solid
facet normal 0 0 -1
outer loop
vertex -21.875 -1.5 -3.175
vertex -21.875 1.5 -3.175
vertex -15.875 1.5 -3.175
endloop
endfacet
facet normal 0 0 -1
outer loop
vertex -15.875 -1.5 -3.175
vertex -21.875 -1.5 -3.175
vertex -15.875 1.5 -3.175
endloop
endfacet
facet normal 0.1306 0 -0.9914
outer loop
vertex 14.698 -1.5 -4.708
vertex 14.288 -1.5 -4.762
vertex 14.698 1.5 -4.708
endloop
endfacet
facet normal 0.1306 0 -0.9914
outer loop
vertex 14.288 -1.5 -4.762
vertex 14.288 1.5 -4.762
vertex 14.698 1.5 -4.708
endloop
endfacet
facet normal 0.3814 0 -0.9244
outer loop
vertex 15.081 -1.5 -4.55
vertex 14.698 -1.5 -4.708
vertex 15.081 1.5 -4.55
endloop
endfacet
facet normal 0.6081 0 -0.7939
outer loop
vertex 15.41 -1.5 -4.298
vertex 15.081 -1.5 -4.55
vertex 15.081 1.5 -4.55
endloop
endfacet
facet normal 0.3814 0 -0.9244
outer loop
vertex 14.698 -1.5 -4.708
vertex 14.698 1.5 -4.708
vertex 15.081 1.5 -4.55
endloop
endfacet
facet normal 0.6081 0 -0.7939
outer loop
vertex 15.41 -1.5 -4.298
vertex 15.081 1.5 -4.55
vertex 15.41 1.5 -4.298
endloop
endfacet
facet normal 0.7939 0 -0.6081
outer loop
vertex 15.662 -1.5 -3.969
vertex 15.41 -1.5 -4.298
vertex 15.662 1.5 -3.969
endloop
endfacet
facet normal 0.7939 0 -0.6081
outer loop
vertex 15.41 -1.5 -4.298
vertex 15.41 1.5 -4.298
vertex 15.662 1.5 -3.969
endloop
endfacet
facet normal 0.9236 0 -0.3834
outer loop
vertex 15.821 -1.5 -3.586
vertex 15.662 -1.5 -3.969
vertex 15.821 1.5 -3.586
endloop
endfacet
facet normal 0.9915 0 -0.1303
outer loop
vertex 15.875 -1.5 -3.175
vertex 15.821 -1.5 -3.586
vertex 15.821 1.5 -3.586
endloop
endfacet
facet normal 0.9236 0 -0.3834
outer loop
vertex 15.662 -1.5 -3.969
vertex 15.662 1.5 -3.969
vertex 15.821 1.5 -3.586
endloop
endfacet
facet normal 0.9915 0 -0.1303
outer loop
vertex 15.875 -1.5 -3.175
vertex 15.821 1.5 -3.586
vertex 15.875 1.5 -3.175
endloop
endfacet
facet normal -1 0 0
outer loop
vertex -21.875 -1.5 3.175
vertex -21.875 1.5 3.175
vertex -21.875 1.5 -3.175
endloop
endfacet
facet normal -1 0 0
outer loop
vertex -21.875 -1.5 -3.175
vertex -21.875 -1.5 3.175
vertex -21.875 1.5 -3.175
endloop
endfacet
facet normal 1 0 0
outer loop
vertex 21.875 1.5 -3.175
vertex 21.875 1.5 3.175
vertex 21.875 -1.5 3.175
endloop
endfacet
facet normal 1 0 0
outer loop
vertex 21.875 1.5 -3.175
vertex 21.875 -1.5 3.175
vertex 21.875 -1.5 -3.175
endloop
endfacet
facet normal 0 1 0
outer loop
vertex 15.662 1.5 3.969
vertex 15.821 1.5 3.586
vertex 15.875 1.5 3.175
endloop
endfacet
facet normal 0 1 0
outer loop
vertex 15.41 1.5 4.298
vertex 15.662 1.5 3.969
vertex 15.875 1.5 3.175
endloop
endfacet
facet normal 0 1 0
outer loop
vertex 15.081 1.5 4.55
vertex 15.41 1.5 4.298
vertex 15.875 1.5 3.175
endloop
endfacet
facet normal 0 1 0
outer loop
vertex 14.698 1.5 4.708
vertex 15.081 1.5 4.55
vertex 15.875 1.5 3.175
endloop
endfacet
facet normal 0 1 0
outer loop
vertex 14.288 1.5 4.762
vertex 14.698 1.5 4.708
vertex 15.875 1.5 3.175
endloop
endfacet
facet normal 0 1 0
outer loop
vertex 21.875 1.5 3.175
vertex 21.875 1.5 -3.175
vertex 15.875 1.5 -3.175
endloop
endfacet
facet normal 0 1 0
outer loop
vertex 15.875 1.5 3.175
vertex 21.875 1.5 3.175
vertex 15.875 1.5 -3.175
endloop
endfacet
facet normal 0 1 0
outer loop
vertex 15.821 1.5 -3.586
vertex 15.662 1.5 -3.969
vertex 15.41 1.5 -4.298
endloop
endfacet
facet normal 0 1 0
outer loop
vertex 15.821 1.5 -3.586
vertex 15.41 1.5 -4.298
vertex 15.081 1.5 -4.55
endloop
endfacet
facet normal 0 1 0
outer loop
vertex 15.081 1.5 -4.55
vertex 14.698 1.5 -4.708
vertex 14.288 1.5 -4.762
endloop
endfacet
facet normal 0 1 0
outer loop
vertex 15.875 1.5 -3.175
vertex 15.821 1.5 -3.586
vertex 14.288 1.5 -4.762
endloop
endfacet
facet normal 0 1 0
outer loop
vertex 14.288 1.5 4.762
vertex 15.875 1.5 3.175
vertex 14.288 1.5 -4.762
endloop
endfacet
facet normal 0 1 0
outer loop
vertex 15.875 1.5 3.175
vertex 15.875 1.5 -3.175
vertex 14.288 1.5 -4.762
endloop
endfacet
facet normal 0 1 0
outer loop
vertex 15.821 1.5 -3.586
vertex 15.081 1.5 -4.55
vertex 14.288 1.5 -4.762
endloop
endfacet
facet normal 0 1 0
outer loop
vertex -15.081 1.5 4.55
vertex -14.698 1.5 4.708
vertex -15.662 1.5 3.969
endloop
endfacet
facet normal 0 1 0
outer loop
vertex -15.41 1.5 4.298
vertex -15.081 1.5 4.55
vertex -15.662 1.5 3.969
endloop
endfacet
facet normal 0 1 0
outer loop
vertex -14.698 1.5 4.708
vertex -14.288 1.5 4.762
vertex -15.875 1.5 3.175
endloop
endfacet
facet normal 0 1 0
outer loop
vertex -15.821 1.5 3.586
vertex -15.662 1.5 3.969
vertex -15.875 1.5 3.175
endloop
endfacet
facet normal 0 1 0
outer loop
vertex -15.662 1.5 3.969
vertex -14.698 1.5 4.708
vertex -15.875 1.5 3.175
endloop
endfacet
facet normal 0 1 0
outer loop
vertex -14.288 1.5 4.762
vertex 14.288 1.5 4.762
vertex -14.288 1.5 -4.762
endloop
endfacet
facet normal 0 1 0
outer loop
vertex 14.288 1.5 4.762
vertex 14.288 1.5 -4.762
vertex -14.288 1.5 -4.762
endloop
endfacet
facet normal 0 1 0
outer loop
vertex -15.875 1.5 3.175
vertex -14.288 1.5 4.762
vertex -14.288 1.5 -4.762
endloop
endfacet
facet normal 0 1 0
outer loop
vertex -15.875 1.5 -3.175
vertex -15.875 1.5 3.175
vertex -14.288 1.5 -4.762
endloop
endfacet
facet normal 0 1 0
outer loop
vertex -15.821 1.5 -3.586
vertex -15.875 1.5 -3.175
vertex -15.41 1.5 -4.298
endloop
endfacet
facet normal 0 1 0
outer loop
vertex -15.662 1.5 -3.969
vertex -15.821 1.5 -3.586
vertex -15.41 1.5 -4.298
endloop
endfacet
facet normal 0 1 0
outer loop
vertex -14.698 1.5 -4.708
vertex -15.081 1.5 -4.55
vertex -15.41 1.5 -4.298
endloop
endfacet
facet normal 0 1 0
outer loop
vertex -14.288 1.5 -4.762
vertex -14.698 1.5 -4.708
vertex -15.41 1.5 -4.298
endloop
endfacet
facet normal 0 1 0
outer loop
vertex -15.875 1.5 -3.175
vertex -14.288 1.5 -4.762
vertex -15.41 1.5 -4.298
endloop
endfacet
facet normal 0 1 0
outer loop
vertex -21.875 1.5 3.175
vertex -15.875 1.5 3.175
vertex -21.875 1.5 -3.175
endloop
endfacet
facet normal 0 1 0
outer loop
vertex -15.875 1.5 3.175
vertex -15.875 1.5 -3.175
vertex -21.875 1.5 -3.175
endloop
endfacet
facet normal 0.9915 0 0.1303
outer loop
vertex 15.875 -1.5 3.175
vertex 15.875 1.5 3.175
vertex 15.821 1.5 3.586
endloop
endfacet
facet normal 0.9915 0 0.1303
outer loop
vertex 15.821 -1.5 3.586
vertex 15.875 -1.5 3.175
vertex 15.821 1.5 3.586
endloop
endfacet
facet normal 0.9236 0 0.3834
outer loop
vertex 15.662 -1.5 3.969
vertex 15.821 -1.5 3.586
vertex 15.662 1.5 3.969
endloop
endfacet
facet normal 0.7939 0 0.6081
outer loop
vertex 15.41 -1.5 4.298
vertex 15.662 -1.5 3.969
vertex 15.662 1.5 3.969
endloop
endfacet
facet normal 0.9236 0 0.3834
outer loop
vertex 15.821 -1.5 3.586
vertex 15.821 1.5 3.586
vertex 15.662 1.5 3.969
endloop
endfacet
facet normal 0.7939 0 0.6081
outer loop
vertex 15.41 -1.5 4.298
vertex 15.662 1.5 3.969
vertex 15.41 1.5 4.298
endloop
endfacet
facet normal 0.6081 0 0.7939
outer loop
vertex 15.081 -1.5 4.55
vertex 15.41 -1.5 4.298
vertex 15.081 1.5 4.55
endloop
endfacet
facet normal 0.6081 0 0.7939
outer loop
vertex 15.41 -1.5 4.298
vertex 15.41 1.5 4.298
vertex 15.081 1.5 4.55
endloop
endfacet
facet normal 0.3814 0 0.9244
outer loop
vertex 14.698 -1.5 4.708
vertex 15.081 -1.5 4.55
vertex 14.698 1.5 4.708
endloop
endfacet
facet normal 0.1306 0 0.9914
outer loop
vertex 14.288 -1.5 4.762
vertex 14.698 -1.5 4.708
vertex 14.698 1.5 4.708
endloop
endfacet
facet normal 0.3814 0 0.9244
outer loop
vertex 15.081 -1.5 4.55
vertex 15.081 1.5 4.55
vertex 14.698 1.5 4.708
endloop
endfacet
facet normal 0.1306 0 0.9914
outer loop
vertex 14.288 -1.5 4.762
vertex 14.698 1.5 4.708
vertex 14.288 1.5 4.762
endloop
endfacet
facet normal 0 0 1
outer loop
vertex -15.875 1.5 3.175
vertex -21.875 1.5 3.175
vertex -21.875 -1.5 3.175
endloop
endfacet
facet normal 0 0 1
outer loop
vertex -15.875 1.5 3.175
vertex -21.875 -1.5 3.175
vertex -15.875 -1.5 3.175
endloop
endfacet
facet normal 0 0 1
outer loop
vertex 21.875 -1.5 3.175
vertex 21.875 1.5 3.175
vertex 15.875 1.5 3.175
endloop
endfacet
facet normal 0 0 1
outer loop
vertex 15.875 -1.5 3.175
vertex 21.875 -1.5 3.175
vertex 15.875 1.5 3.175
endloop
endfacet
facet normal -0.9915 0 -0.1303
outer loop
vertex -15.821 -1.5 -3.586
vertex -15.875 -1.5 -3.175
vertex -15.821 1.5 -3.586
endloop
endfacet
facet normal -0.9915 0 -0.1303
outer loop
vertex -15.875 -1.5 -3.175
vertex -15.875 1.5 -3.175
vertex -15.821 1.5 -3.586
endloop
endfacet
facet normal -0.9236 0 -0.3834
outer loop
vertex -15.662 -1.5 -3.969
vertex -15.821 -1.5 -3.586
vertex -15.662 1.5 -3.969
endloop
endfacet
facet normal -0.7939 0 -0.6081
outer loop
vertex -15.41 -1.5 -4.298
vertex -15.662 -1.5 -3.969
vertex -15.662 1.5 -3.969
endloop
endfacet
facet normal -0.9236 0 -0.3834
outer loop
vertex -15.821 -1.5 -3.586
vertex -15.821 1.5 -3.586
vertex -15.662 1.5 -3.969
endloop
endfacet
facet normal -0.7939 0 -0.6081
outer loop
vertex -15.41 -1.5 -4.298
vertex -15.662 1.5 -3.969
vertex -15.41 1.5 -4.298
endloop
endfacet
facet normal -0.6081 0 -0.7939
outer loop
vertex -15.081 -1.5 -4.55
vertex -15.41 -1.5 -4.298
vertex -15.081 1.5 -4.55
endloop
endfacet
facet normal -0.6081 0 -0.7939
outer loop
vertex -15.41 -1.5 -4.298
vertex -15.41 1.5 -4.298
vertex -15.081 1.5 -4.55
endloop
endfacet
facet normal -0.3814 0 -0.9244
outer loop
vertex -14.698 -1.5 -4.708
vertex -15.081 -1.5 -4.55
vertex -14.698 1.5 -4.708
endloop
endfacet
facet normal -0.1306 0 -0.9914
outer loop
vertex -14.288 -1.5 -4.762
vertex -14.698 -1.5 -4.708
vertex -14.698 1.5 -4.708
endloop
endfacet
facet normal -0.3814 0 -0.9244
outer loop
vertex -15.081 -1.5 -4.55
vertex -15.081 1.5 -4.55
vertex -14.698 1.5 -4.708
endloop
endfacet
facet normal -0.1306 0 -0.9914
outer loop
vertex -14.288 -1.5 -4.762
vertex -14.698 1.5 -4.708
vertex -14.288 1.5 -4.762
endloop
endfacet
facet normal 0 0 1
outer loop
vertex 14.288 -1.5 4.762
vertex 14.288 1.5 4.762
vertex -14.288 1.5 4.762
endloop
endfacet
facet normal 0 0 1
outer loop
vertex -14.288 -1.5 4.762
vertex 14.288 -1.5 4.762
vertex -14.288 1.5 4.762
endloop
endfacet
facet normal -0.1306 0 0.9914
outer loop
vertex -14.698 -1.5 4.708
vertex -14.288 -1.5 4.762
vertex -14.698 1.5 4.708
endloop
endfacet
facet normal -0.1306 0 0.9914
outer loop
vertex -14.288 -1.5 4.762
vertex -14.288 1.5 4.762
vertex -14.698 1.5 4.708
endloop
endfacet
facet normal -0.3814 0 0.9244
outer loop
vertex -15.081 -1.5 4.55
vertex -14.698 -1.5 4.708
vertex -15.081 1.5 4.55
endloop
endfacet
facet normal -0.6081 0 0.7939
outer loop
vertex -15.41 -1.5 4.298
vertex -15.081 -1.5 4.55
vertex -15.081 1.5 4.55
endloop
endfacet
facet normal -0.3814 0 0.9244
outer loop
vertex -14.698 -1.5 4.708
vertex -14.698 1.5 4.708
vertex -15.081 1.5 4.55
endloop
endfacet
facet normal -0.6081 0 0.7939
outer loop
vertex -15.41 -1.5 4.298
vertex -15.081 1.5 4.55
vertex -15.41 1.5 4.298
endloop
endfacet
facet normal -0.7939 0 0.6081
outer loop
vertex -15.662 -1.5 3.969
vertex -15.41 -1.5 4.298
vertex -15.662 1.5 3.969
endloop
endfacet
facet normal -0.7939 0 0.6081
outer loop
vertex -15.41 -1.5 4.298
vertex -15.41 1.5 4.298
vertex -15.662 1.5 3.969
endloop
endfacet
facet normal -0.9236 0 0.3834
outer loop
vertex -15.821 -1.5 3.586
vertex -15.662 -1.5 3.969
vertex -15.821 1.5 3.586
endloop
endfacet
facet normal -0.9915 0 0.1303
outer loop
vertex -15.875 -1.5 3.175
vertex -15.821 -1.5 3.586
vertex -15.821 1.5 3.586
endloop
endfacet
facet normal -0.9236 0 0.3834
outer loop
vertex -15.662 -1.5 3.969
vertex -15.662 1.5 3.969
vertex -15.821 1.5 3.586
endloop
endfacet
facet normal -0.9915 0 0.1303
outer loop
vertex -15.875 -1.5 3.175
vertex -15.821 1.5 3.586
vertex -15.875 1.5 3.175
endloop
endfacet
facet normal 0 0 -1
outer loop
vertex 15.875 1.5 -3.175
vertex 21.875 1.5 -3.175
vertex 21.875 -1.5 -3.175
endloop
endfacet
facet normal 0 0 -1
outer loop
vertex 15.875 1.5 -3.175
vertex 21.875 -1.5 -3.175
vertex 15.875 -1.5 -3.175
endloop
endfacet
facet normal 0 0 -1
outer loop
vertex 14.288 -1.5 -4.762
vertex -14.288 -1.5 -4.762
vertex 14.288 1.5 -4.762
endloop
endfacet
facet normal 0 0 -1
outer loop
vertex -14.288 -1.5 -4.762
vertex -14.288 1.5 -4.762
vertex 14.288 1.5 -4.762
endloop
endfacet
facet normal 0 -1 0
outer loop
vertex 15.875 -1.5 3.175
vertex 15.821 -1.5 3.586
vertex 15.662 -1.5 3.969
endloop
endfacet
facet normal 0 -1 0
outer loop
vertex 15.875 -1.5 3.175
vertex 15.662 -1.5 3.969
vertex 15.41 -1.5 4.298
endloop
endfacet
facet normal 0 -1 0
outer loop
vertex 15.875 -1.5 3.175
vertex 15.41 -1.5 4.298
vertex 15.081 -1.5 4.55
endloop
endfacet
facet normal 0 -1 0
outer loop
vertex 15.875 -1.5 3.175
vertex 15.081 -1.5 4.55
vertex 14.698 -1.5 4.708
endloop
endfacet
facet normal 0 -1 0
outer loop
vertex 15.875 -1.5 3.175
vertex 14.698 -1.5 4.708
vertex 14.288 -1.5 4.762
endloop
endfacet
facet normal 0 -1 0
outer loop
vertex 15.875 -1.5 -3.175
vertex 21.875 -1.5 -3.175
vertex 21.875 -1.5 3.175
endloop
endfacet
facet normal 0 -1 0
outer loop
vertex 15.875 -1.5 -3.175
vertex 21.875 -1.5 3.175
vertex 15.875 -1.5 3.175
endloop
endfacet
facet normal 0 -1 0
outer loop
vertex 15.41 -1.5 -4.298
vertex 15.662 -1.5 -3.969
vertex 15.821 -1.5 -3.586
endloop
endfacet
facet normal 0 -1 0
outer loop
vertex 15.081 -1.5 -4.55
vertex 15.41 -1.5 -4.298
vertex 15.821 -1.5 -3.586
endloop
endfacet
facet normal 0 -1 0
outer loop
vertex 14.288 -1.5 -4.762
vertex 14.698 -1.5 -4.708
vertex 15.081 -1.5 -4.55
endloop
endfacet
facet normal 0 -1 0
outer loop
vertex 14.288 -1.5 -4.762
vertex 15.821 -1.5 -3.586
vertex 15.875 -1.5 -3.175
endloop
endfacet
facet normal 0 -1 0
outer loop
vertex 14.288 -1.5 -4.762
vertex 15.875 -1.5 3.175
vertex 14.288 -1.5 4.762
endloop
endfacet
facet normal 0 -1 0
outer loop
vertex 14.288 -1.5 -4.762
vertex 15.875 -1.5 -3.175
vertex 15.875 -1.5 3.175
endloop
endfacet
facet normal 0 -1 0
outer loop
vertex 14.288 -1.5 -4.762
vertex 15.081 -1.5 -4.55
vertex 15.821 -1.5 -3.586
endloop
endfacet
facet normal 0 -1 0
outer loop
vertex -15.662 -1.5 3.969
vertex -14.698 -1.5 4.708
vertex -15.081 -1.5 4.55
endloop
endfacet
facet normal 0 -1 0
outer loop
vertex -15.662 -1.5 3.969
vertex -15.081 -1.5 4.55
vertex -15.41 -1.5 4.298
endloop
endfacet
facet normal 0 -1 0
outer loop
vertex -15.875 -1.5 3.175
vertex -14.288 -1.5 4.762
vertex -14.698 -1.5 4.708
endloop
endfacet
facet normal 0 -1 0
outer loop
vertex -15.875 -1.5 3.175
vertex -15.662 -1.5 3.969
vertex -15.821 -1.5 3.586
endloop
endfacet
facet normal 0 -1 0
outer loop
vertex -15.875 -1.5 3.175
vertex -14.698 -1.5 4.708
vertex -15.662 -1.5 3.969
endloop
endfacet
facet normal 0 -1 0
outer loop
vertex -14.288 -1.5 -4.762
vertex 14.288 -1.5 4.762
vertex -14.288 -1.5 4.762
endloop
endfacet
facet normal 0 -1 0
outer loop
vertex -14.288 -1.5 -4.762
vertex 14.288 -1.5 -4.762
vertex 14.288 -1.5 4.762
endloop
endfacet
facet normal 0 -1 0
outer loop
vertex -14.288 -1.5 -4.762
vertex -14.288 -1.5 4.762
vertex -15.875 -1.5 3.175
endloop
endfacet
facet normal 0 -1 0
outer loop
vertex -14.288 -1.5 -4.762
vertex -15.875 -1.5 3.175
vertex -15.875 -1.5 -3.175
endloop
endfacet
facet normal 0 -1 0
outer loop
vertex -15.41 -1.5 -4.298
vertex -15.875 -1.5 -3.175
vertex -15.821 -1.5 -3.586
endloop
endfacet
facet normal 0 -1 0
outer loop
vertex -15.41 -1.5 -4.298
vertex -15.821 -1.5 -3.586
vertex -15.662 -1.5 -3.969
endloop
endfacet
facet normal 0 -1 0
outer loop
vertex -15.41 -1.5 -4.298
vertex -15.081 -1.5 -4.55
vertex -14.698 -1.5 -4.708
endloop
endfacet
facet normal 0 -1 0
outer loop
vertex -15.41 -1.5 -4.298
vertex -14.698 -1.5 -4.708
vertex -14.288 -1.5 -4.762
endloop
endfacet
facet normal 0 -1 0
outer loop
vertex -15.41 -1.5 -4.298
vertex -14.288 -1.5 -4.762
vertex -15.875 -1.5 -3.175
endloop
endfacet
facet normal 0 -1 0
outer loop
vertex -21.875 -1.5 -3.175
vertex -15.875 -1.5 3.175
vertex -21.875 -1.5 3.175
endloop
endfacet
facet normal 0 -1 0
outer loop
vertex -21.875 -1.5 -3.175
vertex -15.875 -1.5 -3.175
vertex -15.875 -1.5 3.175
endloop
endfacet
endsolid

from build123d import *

# Parameters (mm, degrees)
BOSS_EXTRUDE1_DEPTH = 1.5
SKETCH2_W           = 6
SKETCH2_H           = 6.35
BOSS_EXTRUDE2_DEPTH = 3


with BuildPart() as part:
    # Sketch1 → Boss-Extrude1 (new, symmetric)
    with BuildSketch(Plane(origin=(0, 0, 0), x_dir=(1, 0, 0), z_dir=(0, 1, 0))):
        with BuildLine():
            Line((14.2875, -4.7625), (-14.2875, -4.7625))
            ThreePointArc((-14.2875, -4.7625), (-15.410032015, -4.297532015), (-15.875, -3.175))
            Line((-15.875, -3.175), (-15.875, 3.175))
            ThreePointArc((-15.875, 3.175), (-15.410032015, 4.297532015), (-14.2875, 4.7625))
            Line((-14.2875, 4.7625), (14.2875, 4.7625))
            ThreePointArc((14.2875, 4.7625), (15.410032015, 4.297532015), (15.875, 3.175))
            Line((15.875, 3.175), (15.875, -3.175))
            ThreePointArc((15.875, -3.175), (15.410032015, -4.297532015), (14.2875, -4.7625))
        make_face()
    extrude(amount=BOSS_EXTRUDE1_DEPTH, both=True)

    # Sketch2 → Boss-Extrude2 (add)
    with BuildSketch(Plane(origin=(0, 1.5, 0), x_dir=(1, 0, 0), z_dir=(0, 1, 0))):
        with Locations((-18.875, 0)):
            Rectangle(SKETCH2_W, SKETCH2_H)
    boss_extrude2 = extrude(amount=-BOSS_EXTRUDE2_DEPTH)

    # Mirror1: Boss-Extrude2 across plane
    add(boss_extrude2.mirror(Plane(origin=(0, 0, 0), x_dir=(0, 0, 1), z_dir=(1, 0, 0))))


solid = part.part
